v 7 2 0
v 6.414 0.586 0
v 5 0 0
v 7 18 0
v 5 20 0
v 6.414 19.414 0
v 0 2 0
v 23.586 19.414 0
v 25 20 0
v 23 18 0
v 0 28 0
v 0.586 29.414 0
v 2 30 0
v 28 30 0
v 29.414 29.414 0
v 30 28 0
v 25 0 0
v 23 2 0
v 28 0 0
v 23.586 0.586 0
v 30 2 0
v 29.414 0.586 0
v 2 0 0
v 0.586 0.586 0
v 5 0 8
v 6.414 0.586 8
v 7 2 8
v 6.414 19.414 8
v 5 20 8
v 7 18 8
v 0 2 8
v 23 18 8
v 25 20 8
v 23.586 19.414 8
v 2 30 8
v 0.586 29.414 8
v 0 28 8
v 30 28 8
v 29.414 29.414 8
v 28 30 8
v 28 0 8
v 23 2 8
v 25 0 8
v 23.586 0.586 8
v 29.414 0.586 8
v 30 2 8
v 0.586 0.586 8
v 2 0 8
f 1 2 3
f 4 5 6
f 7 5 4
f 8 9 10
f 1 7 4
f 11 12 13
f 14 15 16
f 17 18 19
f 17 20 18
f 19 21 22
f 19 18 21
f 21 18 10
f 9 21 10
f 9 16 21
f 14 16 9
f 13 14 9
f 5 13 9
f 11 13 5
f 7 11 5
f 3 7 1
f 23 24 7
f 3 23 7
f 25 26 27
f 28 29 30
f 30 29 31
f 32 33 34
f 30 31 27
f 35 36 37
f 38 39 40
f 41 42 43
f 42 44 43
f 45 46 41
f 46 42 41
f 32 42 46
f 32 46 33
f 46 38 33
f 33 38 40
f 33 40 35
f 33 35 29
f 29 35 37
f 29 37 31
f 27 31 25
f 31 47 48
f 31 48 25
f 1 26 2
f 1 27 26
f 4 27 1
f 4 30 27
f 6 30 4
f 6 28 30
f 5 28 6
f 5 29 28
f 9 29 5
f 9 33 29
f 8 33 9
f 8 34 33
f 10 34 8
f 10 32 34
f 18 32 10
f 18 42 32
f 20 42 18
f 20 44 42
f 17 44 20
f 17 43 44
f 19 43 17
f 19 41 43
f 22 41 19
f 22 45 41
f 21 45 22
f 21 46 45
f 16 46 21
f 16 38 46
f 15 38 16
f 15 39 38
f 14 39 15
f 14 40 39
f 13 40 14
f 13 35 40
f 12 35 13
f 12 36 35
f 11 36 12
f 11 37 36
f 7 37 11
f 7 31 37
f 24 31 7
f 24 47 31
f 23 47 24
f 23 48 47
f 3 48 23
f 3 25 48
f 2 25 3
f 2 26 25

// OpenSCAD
$fn = 32;

// ----------------------------------------------------------------------
// Clip blank: staple clip, 8 mm thick
// ----------------------------------------------------------------------

// --- parameters (mm) ---
profile_height = 8;       // extrusion height
profile_points = 24;      // points of the closed outline

profile = [[0, 2], [0.586, 0.586], [2, 0], [5, 0], [6.414, 0.586], [7, 2], [7, 18], [6.414, 19.414], [5, 20], [25, 20], [23.586, 19.414], [23, 18], [23, 2], [23.586, 0.586], [25, 0], [28, 0], [29.414, 0.586], [30, 2], [30, 28], [29.414, 29.414], [28, 30], [2, 30], [0.586, 29.414], [0, 28]];  // single closed polygon, 24 points, counter clockwise

// --- the one profile operation ---
linear_extrude(height = profile_height) polygon(points = profile);
